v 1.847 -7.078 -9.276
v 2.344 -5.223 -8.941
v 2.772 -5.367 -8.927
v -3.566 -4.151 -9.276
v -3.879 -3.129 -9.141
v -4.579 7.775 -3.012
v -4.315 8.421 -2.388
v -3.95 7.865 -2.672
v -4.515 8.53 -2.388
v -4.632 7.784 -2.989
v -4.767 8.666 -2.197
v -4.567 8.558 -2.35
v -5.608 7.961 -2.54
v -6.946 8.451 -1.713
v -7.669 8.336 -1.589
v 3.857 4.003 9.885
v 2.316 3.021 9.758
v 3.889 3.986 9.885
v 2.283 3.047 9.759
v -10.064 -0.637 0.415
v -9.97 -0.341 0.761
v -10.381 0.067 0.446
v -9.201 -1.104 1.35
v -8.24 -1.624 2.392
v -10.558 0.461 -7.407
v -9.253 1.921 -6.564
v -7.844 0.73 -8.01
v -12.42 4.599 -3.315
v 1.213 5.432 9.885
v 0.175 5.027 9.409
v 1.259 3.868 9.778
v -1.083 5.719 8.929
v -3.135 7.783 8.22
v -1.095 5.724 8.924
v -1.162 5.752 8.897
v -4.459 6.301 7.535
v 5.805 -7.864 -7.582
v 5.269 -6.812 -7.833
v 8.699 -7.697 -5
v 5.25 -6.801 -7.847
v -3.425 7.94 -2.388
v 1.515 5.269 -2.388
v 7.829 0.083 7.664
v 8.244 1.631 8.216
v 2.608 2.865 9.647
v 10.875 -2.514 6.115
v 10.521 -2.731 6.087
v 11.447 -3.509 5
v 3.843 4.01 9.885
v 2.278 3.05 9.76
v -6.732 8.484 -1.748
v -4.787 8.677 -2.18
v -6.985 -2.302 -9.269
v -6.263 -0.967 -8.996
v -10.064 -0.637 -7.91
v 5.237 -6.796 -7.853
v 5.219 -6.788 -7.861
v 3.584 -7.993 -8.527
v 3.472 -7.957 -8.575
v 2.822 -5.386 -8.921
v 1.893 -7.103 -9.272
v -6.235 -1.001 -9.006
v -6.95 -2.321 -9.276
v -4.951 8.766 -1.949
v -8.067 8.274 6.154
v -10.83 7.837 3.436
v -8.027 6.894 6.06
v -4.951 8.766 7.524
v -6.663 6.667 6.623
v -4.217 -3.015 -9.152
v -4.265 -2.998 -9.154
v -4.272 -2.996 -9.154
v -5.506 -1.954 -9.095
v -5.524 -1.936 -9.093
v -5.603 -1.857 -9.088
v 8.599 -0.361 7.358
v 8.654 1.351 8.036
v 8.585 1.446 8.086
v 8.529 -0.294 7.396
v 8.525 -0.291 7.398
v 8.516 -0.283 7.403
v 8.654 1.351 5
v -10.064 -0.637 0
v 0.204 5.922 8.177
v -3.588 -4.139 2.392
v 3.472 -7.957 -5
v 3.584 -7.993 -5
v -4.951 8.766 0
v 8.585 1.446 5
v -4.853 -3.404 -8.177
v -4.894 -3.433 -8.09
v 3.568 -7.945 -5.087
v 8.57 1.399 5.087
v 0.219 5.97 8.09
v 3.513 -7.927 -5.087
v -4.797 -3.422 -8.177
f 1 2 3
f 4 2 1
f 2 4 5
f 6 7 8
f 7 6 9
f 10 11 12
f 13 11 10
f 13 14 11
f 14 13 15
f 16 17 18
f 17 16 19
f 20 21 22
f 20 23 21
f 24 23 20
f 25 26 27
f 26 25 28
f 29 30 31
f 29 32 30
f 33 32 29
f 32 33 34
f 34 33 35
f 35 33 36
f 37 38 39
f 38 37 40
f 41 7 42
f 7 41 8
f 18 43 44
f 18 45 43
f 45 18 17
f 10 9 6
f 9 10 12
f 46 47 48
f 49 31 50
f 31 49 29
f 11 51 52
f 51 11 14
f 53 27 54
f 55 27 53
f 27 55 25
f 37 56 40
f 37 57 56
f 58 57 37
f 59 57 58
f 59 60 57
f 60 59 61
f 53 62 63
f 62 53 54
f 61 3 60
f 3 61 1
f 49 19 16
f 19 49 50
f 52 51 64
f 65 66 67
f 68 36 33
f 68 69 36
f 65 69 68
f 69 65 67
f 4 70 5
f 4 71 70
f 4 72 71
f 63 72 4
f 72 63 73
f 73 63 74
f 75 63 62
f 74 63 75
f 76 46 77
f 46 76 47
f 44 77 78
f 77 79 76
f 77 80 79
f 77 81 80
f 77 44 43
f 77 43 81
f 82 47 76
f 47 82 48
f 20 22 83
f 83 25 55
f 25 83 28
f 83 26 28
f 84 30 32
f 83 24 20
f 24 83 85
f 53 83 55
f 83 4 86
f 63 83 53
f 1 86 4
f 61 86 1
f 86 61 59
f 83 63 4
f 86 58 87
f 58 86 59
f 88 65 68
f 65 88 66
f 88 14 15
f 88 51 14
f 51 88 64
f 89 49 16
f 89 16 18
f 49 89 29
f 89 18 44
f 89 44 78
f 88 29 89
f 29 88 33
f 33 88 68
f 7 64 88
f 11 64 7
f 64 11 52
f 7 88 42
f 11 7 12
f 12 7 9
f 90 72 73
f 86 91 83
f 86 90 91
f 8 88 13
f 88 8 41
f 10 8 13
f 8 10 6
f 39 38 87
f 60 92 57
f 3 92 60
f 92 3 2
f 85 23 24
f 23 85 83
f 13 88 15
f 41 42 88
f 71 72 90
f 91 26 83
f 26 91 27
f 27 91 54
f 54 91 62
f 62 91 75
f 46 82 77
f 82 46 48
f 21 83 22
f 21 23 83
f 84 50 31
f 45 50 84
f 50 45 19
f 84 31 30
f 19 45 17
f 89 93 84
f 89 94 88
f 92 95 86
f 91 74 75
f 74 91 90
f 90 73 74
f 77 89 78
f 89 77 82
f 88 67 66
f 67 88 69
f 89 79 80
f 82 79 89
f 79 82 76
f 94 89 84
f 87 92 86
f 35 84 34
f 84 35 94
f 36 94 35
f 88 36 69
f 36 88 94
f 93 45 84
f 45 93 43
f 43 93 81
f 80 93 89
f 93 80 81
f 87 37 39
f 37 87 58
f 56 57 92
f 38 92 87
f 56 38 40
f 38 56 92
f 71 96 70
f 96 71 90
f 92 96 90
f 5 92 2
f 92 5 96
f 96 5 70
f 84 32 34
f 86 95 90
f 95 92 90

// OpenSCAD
// Auto-generated OpenSCAD file

    inner_points = 10*[[-1.7845387792055995e-15, -1.859095349230593e-15, -1.618033988749895], [1.7845387792055995e-15, 1.859095349230593e-15, 1.618033988749895], [-1.3536265463755464, 0.7319352168718941, -0.49999999999999933], [-1.3536265463755455, 0.7319352168718953, 0.5000000000000007], [1.3536265463755455, -0.7319352168718953, -0.5000000000000007], [1.3536265463755464, -0.7319352168718941, 0.49999999999999933], [-0.8365872137342245, 0.45236084158985485, -1.309016994374947], [-0.8365872137342216, 0.4523608415898579, 1.309016994374948], [0.8365872137342216, -0.4523608415898579, -1.309016994374948], [0.8365872137342245, -0.45236084158985485, 1.309016994374947], [-0.9983252747658171, -0.0578502010692763, 1.1675275179479784e-15], [-0.49820742844767774, 0.8670578747924227, -4.467599515296164e-16], [-0.48128594212449544, -0.3374245763513155, -0.8090169943749466], [0.018831904193644222, 0.5874834995103835, -0.8090169943749481], [-0.4812859421244936, -0.3374245763513135, 0.8090169943749483], [0.018831904193646, 0.5874834995103853, 0.8090169943749468], [0.35530127160972824, -0.7897854179411714, -0.4999999999999995], [0.8554191179278678, 0.13512265792052747, -0.5000000000000011], [0.3553012716097293, -0.7897854179411703, 0.5000000000000006], [0.8554191179278688, 0.13512265792052863, 0.4999999999999989]];

    outer_points = 10*[[-1.4881280115199031, 0.0, -0.6352235906196446], [1.4881280115199031, 0.0, 0.6352235906196446], [-0.10491467048796077, -1.2452425677866739, -1.0278121657376647], [0.8147990202421345, -1.2452425677866739, -0.6352223962789754], [-0.8147990202421345, 1.2452425677866739, 0.6352223962789754], [0.10491467048796077, 1.2452425677866739, 1.0278121657376647], [-0.9845545230101506, -0.7696022311303593, -1.027812621935206], [1.423287179239848, -0.7696022311303593, 7.381431278430384e-07], [-1.423287179239848, 0.7696022311303593, -7.381431278430384e-07], [0.9845545230101506, 0.7696022311303593, 1.027812621935206], [0.36322496660595616, -0.37947419135933846, -0.8509212429633416], [0.029189450705503803, -0.9972321321950521, -0.06838165313313897], [-0.5164148859162335, 0.09616614529697598, -0.8509216991608831], [-0.8504504018166859, -0.5215917955387377, -0.06838210933068053], [0.9717131256036696, 0.09616614529697598, -0.2156981085412385], [0.6376776097032173, -0.5215917955387377, 0.566841481288964], [-0.45157405363617825, 0.8657683764273354, -0.21569884668436626], [-0.7856095695366306, 0.24801043559162173, 0.5668407431458362], [0.468139637093917, 0.8657683764273354, 0.17689092277432297], [0.1341041211934646, 0.24801043559162173, 0.9594305126045255]];

    // Convex hull for inner set (I)
    module inner_hull() {
        hull() {
            for (p = inner_points) {
                translate(p) sphere(r=0.1);
            }
        }
    }

    // Convex hull for outer set (O) minus inner hull (O \ I)
    module outer_minus_inner() {
        difference() {
            hull() {
                for (p = outer_points) {
                    translate(p) sphere(r=0.1);
                }
            }
            inner_hull(); // Subtract inner hull
        }
    }

    // Convex hull for outer set (O) minus all translated inner hulls
    module outer_minus_AllTranslationInner() {
        difference() {
            hull() {
                for (p = outer_points) {
                    translate(p) sphere(r=0.1);
                }
            }
            hull() {
                translate([0,0,50]) inner_hull();
                translate([0,0,-50]) inner_hull();
            }; // Subtract translated inner hulls
        }
    }

    // Difference between outer_minus_inner and outer_minus_AllTranslationInner
    module outer_minus_inner_diff() {
        difference() {
            // Outer minus inner
            difference() {
                hull() {
                    for (p = outer_points) {
                        translate(p) sphere(r=0.1);
                    }
                }
                inner_hull();
            }

            // Subtract Outer minus AllTranslationInner
            difference() {
                hull() {
                    for (p = outer_points) {
                        translate(p) sphere(r=0.1);
                    }
                }
                hull() {
                    translate([0,0,50]) inner_hull();
                    translate([0,0,-50]) inner_hull();
                };
            }
        }
    }

    // Rendering all with colors applied
    color([1, 1, 0, 1]) outer_minus_inner_diff(); // Opaque yellow
    
